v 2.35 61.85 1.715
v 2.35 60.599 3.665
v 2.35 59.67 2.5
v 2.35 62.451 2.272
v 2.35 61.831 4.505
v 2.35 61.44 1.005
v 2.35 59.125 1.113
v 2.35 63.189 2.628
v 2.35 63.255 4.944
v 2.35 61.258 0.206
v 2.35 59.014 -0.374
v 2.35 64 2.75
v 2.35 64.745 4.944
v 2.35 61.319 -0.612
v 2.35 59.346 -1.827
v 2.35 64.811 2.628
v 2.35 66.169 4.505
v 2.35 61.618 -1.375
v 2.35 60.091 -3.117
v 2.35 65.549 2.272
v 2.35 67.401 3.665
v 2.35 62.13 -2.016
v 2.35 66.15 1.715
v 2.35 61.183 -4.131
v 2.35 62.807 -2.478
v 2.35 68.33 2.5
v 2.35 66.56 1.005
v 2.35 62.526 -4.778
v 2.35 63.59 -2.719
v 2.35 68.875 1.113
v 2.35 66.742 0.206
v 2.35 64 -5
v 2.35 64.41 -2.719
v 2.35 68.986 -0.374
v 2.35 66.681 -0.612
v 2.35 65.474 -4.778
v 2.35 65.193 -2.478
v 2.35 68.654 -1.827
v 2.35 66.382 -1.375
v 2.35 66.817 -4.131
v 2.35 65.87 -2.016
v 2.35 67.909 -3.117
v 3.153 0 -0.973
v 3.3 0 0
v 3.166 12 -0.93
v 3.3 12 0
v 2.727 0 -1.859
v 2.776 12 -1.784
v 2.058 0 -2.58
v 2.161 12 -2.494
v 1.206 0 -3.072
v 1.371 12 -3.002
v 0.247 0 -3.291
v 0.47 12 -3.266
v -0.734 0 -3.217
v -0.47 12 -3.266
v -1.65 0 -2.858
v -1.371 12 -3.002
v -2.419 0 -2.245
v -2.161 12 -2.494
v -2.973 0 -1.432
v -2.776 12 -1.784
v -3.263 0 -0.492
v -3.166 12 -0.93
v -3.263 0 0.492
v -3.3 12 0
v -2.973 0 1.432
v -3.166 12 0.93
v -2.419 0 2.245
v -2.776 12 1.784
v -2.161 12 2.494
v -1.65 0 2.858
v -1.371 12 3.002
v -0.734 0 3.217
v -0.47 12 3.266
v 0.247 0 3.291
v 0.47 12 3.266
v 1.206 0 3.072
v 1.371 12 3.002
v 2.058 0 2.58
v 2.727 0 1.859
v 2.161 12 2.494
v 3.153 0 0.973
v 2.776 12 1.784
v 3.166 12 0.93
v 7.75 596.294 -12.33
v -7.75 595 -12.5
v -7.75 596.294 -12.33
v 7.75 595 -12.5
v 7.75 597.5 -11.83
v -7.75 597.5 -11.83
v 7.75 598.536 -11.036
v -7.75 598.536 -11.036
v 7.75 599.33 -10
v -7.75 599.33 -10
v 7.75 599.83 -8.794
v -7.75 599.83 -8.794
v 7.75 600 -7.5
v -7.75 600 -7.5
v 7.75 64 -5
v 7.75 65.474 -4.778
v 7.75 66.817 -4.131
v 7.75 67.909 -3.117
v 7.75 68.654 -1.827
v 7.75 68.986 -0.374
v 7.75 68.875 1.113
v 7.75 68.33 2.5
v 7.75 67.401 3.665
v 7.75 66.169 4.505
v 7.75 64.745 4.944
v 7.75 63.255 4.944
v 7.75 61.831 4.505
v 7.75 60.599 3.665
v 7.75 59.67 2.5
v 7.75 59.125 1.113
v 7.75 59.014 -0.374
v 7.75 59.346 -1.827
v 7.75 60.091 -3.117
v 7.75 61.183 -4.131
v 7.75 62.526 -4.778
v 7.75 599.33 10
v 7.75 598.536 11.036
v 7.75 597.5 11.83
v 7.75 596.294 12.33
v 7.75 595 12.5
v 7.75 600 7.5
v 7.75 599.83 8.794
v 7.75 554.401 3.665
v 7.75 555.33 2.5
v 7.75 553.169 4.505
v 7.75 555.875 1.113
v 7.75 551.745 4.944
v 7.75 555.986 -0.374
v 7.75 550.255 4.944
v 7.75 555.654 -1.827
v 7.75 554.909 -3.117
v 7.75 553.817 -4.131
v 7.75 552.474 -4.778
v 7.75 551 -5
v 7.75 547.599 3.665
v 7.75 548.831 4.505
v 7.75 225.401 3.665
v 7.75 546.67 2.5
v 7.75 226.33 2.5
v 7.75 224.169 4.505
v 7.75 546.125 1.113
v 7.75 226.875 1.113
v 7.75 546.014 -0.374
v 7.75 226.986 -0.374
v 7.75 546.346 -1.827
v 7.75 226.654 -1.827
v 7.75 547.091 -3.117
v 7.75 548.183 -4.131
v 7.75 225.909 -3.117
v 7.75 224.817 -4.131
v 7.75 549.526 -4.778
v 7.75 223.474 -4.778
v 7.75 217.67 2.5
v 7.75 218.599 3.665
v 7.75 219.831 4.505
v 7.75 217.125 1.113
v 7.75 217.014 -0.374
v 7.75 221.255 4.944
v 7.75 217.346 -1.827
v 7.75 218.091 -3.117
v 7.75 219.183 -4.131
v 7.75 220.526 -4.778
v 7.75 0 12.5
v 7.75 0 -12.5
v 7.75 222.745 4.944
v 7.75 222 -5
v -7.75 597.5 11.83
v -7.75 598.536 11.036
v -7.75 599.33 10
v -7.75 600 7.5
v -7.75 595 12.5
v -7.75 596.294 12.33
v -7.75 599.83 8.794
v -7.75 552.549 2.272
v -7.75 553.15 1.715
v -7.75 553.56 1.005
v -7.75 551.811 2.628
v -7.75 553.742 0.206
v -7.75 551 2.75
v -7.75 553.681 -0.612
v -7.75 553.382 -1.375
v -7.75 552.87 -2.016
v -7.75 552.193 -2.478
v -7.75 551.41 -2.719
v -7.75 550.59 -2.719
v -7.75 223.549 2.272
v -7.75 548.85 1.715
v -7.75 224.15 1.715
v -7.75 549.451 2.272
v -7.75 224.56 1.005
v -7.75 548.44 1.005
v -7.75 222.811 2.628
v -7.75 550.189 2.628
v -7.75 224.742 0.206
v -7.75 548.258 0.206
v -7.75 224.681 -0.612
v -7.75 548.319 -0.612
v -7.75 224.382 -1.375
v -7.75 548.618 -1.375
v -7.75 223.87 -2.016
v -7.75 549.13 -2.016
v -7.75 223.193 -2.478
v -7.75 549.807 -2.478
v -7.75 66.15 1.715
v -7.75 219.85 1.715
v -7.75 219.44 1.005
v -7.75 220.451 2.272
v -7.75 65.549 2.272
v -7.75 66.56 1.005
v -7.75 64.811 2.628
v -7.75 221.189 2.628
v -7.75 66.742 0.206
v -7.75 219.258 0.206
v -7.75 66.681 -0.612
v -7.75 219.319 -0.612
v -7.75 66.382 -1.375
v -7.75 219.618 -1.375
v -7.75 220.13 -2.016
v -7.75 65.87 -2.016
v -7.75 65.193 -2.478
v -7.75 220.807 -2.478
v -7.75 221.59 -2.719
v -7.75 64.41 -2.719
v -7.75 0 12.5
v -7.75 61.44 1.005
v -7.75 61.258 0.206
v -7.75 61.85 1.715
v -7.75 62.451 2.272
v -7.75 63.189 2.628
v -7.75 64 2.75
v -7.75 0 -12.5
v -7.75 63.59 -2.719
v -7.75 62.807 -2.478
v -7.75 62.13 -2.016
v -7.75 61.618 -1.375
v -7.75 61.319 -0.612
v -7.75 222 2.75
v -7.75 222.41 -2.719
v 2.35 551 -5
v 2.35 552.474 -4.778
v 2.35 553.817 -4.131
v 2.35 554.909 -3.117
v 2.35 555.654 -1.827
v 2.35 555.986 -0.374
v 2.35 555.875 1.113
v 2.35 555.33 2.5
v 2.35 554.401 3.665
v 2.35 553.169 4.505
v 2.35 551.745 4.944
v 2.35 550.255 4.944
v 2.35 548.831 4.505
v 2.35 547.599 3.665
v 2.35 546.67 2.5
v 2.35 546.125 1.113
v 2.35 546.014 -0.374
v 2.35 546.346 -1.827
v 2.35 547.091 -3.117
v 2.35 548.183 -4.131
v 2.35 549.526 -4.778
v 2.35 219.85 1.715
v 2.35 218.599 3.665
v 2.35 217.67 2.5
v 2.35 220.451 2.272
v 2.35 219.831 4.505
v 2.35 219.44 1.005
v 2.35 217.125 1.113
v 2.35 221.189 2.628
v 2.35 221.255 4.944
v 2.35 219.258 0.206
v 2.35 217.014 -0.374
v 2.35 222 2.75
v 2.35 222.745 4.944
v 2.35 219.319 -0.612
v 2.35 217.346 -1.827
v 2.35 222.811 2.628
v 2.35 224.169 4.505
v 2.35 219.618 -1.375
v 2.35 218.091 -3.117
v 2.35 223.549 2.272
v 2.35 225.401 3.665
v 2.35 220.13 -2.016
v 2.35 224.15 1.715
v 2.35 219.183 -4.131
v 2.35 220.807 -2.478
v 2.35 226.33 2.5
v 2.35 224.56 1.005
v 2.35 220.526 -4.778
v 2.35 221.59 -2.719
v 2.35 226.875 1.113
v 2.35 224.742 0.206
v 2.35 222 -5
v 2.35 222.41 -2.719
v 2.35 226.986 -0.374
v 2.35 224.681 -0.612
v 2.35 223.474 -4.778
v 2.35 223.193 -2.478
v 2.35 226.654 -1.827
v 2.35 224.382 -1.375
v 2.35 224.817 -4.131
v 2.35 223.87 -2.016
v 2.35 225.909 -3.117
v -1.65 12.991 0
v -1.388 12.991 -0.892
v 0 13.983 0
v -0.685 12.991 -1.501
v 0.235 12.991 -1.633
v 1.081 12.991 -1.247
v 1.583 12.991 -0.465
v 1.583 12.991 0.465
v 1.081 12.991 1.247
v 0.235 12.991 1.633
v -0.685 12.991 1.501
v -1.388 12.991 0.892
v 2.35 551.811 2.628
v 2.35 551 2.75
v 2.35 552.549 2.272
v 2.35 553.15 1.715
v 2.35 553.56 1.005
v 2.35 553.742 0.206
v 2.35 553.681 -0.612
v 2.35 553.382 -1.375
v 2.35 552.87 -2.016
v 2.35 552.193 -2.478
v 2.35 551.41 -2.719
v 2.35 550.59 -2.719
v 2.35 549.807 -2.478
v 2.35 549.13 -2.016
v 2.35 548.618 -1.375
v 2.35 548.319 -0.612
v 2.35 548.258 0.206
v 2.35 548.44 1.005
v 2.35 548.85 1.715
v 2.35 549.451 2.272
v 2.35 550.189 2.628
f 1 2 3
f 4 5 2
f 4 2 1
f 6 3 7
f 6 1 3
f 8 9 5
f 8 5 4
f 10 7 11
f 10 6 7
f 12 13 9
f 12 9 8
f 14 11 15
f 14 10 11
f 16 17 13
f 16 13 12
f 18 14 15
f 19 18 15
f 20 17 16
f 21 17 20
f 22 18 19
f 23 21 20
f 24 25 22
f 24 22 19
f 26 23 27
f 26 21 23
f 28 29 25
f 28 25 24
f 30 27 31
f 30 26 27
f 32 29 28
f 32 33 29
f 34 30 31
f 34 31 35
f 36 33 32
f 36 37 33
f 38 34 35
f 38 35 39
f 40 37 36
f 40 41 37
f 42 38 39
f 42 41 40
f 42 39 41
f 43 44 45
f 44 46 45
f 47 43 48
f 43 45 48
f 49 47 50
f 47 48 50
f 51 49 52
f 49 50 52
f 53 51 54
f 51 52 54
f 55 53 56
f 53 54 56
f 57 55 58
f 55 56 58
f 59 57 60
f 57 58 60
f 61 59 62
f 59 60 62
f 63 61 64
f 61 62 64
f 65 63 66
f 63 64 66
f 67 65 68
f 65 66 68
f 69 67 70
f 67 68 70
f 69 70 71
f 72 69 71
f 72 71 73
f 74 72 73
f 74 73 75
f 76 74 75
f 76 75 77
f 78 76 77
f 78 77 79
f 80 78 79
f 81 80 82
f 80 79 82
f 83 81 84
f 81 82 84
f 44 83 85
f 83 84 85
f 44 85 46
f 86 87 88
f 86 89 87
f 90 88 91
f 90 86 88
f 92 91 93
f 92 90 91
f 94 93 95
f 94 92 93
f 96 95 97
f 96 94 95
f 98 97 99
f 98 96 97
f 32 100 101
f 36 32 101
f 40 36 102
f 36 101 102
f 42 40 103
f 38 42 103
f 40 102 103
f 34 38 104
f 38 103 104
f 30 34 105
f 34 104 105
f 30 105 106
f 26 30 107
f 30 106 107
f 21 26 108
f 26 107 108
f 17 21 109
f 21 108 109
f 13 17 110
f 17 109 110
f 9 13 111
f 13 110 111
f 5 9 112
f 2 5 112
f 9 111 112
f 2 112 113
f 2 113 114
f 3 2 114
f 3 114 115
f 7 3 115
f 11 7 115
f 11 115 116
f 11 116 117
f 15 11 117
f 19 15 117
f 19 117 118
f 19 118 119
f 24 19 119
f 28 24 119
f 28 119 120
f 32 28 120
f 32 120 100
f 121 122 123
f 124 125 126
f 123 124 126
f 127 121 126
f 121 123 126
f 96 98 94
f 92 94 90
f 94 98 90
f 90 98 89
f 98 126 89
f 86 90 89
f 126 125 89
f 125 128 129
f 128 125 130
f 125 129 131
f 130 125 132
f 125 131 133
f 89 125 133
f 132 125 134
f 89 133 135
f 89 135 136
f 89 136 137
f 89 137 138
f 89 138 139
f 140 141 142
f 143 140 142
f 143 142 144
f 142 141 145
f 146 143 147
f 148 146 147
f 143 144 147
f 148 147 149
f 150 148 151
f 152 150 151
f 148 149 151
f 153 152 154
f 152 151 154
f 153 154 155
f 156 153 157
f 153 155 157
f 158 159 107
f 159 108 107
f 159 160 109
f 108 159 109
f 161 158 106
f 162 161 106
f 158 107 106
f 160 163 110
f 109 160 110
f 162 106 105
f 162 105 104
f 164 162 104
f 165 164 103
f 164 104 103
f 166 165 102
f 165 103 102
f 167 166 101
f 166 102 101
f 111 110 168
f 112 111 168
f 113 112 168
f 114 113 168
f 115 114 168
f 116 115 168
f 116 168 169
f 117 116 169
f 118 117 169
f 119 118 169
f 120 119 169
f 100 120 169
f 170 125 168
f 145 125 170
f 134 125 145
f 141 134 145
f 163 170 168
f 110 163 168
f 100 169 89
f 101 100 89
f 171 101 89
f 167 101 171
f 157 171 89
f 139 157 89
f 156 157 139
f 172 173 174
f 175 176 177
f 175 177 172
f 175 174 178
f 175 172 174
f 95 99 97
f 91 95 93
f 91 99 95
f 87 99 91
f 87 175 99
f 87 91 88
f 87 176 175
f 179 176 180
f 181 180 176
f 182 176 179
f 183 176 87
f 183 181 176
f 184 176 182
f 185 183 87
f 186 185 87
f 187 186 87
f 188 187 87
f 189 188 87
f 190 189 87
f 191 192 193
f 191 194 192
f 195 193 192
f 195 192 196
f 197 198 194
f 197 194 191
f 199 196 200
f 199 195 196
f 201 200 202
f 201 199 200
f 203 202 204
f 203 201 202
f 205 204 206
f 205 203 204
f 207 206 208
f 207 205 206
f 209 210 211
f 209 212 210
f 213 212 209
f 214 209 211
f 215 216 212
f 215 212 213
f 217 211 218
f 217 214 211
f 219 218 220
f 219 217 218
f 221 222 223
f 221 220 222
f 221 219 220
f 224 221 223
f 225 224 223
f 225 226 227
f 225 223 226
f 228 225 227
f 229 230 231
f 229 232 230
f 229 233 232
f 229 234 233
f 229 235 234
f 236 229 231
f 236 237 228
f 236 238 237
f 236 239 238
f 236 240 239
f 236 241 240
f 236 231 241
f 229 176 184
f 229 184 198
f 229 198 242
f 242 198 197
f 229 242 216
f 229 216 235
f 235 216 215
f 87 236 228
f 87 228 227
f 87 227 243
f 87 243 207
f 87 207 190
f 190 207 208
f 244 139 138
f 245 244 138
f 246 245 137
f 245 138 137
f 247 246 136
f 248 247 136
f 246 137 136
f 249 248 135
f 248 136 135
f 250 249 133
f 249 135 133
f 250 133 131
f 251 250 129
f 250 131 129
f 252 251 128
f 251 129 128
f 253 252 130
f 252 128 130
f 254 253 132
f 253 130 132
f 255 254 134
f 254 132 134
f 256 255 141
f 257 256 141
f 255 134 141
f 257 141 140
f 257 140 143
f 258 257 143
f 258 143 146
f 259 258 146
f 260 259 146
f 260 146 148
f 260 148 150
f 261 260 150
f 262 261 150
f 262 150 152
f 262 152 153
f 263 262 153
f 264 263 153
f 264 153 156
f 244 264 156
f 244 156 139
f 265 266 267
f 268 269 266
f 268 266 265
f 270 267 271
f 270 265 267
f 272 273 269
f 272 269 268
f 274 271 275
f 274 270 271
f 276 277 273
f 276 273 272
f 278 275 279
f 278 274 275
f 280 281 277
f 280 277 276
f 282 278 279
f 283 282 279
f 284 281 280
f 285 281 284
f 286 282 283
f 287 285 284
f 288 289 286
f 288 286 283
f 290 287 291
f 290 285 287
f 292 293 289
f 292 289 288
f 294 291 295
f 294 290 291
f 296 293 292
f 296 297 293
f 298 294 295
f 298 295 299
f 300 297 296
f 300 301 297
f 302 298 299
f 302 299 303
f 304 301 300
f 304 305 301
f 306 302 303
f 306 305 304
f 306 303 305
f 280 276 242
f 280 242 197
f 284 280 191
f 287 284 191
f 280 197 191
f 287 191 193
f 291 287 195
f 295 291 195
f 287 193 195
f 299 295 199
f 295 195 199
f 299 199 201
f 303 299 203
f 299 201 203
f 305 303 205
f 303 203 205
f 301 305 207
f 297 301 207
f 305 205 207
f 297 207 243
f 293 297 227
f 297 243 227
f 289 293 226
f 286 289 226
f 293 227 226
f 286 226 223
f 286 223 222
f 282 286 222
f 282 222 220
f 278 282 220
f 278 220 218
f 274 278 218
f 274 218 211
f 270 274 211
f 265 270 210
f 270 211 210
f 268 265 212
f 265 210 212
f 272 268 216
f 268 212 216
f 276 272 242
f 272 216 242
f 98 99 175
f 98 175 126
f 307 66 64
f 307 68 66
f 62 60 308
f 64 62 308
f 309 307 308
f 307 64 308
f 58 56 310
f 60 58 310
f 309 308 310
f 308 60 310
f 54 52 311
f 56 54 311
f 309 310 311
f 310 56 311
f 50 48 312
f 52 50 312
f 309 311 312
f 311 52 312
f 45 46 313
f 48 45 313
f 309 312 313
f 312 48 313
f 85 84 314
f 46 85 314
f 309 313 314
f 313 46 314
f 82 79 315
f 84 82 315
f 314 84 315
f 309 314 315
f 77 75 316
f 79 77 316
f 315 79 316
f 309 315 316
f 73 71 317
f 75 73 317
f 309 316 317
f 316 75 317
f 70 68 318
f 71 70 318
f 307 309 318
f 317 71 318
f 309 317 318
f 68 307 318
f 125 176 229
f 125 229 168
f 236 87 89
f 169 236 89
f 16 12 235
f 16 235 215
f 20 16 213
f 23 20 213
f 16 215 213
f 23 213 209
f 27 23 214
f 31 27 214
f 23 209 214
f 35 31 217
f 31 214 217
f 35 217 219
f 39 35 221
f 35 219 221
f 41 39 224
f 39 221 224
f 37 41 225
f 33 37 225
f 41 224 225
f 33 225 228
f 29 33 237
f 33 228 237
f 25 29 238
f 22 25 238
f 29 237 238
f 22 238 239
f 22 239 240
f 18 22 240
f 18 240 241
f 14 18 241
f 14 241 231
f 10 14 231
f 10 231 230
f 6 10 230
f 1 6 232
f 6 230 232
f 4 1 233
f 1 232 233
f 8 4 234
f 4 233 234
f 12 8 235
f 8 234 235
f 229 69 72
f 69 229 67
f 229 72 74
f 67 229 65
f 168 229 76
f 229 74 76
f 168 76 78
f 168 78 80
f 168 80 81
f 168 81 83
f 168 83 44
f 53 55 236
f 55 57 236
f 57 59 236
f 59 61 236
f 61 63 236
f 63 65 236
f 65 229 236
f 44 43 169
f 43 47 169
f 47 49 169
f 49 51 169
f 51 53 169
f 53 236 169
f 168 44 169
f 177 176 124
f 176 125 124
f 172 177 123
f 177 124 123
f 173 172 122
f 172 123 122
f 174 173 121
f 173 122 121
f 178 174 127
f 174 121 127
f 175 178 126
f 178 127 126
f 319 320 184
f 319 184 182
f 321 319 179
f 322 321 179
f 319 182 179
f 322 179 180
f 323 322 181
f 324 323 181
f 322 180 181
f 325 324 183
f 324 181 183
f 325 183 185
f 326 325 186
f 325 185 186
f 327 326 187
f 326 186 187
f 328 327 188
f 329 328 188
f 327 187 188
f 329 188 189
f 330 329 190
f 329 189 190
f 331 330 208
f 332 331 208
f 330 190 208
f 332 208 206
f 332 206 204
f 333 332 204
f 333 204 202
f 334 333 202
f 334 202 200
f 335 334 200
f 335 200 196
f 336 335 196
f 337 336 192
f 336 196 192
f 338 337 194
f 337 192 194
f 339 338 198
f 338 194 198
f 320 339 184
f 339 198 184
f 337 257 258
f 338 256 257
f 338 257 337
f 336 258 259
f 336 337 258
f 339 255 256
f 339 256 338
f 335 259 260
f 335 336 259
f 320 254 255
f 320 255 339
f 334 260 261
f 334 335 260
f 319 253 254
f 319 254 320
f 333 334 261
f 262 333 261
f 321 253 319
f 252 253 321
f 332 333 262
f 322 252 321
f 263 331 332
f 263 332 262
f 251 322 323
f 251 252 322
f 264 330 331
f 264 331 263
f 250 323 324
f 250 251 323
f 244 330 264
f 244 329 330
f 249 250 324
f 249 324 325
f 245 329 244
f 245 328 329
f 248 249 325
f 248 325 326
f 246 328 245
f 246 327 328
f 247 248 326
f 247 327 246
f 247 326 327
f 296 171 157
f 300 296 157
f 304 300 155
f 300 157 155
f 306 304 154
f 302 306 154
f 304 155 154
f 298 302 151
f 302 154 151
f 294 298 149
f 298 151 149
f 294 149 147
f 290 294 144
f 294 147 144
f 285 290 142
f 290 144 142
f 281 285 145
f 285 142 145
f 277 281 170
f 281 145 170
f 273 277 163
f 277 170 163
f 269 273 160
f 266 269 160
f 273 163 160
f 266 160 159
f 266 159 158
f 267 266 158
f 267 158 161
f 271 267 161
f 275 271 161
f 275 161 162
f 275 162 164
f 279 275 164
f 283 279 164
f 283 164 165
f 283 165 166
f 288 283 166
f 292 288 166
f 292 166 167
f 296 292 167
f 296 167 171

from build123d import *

# Parameters (mm, degrees)
SKETCH1_W                                           = 15.5
SKETCH1_H                                           = 25
BOSS_EXTRUDE1_DEPTH                                 = 600
FILLET1_R                                           = 5
F_5_0MM_DOWEL_HOLE1_D                               = 6.6
F_5_0MM_DOWEL_HOLE1_DEPTH                           = 12
F_5_0MM_DOWEL_HOLE1_TIP                             = 1.982840043
CBORE_FOR_M5_HEX_SOCKET_HEAD_CAP_SCREW1_D           = 5.5
CBORE_FOR_M5_HEX_SOCKET_HEAD_CAP_SCREW1_CBORE_D     = 10
CBORE_FOR_M5_HEX_SOCKET_HEAD_CAP_SCREW1_CBORE_DEPTH = 5.4


with BuildPart() as part:
    # Sketch1 → Boss-Extrude1 (new body)
    with BuildSketch(Plane(origin=(0, 0, 0), x_dir=(1, 0, 0), z_dir=(0, 1, 0))):
        Rectangle(SKETCH1_W, SKETCH1_H)
    extrude(amount=BOSS_EXTRUDE1_DEPTH)

    # Fillet1
    fillet1_edges = [part.edges().sort_by_distance(p)[0] for p in [
        (0, 600, 12.5),
        (0, 600, -12.5),
    ]]
    fillet(fillet1_edges, radius=FILLET1_R)

    # Ø5.0mm Dowel Hole1
    with Locations(Plane(origin=(0, 0, 0), x_dir=(-1, 0, 0), z_dir=(0, -1, 0))):
        with Locations((0, 0)):
            Hole(F_5_0MM_DOWEL_HOLE1_D / 2, depth=F_5_0MM_DOWEL_HOLE1_DEPTH)
            with Locations((0, 0, -(F_5_0MM_DOWEL_HOLE1_DEPTH + F_5_0MM_DOWEL_HOLE1_TIP / 2))):  # 118° drill point
                Cone(0, F_5_0MM_DOWEL_HOLE1_D / 2, F_5_0MM_DOWEL_HOLE1_TIP, mode=Mode.SUBTRACT)

    # CBORE for M5 Hex Socket Head Cap Screw1 (through all)
    with Locations(Plane(origin=(7.75, 0, 0), x_dir=(0, 0, -1), z_dir=(1, 0, 0))):
        with Locations((0, 222), (0, 551), (0, 64)):
            CounterBoreHole(CBORE_FOR_M5_HEX_SOCKET_HEAD_CAP_SCREW1_D / 2, CBORE_FOR_M5_HEX_SOCKET_HEAD_CAP_SCREW1_CBORE_D / 2, CBORE_FOR_M5_HEX_SOCKET_HEAD_CAP_SCREW1_CBORE_DEPTH)


solid = part.part
